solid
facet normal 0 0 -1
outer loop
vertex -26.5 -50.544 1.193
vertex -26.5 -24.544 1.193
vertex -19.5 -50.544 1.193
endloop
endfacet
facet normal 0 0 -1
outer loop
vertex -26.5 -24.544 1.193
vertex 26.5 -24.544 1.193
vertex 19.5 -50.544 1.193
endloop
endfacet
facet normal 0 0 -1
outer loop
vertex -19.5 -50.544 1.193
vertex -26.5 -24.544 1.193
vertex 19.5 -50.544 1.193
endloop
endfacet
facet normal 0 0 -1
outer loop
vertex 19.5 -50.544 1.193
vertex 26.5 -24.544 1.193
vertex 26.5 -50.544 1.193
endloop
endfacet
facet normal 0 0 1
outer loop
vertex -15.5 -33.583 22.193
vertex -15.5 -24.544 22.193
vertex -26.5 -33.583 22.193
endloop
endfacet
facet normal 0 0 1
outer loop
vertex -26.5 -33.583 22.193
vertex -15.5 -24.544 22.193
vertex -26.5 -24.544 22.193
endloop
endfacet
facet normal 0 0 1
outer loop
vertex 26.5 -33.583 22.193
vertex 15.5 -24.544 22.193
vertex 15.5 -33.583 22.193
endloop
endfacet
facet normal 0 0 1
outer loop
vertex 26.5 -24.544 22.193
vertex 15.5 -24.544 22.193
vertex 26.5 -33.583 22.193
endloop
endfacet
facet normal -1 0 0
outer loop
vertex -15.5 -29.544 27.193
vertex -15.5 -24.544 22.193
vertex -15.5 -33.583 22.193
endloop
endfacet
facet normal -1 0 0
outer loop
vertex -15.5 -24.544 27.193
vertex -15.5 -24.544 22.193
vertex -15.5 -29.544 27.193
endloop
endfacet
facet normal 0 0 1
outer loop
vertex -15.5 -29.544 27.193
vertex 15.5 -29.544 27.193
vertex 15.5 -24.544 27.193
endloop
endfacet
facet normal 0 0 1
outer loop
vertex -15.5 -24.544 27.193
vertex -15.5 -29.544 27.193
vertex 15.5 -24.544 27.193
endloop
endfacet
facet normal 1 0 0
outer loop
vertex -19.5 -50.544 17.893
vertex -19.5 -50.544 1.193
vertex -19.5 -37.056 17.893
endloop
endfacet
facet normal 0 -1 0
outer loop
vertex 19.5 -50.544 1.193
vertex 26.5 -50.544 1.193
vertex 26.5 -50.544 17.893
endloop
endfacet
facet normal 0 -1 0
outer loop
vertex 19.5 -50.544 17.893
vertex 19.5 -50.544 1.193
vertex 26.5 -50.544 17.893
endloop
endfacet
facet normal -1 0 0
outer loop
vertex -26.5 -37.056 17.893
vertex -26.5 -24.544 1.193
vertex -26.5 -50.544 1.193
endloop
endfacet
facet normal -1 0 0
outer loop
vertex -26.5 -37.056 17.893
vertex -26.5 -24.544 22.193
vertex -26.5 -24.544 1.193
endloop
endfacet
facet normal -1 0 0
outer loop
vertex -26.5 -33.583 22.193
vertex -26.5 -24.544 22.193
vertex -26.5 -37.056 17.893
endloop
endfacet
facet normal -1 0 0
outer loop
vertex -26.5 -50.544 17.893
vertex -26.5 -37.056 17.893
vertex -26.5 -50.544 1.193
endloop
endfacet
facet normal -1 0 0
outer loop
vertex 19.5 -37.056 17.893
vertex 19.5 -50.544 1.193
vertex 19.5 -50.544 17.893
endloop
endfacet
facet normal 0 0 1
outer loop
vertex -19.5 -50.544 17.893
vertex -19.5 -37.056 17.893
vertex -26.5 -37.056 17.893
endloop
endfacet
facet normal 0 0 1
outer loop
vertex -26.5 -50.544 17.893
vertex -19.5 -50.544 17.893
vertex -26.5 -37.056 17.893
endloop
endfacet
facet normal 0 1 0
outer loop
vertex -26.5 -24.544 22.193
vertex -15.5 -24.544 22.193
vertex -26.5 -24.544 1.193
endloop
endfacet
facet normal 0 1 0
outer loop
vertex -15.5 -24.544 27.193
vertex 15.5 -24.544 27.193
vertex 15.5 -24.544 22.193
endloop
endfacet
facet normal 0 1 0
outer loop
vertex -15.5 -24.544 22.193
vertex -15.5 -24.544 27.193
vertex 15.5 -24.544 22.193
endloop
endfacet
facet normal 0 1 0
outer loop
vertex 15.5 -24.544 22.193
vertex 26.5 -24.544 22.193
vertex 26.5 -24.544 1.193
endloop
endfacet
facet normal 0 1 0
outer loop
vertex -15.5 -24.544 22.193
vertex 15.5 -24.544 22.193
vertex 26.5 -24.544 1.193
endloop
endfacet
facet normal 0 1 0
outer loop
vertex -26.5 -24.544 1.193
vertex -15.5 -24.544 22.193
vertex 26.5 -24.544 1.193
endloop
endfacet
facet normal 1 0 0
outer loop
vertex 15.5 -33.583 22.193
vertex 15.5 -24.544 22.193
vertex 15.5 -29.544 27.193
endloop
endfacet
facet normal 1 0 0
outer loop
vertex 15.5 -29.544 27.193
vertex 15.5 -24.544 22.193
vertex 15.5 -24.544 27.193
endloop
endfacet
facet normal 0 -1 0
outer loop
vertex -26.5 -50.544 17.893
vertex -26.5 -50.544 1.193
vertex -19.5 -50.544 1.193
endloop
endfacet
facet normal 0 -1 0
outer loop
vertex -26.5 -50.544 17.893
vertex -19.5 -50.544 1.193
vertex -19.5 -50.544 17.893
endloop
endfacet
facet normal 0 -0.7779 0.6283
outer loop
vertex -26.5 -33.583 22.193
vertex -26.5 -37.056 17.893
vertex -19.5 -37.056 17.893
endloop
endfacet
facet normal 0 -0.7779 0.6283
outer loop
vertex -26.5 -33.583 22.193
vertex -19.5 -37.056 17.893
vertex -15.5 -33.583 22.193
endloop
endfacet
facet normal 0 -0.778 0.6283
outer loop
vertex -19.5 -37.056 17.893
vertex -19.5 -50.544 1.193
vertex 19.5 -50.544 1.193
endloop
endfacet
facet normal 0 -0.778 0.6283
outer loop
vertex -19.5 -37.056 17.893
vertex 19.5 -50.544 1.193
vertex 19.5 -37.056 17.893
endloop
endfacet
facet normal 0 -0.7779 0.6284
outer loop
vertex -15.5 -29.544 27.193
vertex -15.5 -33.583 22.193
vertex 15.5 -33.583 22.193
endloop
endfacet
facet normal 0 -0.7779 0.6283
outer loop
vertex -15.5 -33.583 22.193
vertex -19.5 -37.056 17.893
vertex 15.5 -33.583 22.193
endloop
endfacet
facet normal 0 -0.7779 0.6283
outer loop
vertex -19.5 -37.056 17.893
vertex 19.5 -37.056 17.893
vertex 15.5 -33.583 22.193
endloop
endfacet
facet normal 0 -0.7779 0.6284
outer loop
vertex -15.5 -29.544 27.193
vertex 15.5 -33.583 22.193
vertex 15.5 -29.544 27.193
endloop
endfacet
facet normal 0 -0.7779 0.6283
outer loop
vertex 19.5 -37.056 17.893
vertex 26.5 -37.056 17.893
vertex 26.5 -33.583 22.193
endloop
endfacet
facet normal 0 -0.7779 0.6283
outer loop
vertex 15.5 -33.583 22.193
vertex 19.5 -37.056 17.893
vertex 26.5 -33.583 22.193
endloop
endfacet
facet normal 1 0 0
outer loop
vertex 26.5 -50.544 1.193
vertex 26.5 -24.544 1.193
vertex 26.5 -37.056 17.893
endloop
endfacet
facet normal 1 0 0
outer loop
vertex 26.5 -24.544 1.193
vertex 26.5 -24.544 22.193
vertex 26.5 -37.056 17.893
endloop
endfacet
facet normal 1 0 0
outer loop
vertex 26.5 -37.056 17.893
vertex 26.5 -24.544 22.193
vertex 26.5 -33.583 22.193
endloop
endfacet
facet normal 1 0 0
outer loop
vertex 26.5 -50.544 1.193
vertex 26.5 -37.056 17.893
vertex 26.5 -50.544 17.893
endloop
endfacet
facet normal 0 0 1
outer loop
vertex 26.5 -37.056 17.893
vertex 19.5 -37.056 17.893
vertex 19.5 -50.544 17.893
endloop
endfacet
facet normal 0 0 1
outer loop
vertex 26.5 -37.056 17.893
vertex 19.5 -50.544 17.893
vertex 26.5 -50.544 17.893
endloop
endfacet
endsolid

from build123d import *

# Parameters (mm, degrees)
PAD_DEPTH      = 26.5
PAD_DEPTH_BACK = 26.5
SKETCH001_W    = 5
SKETCH001_H    = 11
POCKET_DEPTH   = 10
SKETCH002_W    = 16.7
SKETCH002_H    = 7
PAD001_DEPTH   = 26


with BuildPart() as part:
    # Sketch → Pad (new body, two sides)
    with BuildSketch(Plane.YZ) as pad_sk:
        Polygon((-24.544346, 1.192678), (-50.544346, 1.192678), (-29.544346, 27.192678), (-24.544346, 27.192678), align=None)
    extrude(amount=PAD_DEPTH)
    extrude(pad_sk.sketch, amount=-PAD_DEPTH_BACK)

    # Sketch001 (on Face4 of Pad) → Pocket (cut)
    with BuildSketch(Plane.ZX.offset(-24.544346)):
        with Locations((24.692678, 21)):
            Rectangle(SKETCH001_W, SKETCH001_H)
    pocket = extrude(amount=-POCKET_DEPTH, mode=Mode.SUBTRACT)

    # Mirrored: Pocket across Sketch001 H_Axis
    add(pocket.mirror(Plane(origin=(0, -24.544346, 0), x_dir=(0, 1, 0), z_dir=(1, 0, 0))), mode=Mode.SUBTRACT)

    # Sketch002 (on Face2 of Mirrored) → Pad001 (join)
    with BuildSketch(Plane.ZX.offset(-24.544346)):
        with Locations((9.542678, 23)):
            Rectangle(SKETCH002_W, SKETCH002_H)
    pad001 = extrude(amount=-PAD001_DEPTH)

    # Mirrored001: Pad001 across Sketch002 H_Axis
    add(pad001.mirror(Plane(origin=(0, -24.544346, 0), x_dir=(0, 1, 0), z_dir=(1, 0, 0))))


solid = part.part
